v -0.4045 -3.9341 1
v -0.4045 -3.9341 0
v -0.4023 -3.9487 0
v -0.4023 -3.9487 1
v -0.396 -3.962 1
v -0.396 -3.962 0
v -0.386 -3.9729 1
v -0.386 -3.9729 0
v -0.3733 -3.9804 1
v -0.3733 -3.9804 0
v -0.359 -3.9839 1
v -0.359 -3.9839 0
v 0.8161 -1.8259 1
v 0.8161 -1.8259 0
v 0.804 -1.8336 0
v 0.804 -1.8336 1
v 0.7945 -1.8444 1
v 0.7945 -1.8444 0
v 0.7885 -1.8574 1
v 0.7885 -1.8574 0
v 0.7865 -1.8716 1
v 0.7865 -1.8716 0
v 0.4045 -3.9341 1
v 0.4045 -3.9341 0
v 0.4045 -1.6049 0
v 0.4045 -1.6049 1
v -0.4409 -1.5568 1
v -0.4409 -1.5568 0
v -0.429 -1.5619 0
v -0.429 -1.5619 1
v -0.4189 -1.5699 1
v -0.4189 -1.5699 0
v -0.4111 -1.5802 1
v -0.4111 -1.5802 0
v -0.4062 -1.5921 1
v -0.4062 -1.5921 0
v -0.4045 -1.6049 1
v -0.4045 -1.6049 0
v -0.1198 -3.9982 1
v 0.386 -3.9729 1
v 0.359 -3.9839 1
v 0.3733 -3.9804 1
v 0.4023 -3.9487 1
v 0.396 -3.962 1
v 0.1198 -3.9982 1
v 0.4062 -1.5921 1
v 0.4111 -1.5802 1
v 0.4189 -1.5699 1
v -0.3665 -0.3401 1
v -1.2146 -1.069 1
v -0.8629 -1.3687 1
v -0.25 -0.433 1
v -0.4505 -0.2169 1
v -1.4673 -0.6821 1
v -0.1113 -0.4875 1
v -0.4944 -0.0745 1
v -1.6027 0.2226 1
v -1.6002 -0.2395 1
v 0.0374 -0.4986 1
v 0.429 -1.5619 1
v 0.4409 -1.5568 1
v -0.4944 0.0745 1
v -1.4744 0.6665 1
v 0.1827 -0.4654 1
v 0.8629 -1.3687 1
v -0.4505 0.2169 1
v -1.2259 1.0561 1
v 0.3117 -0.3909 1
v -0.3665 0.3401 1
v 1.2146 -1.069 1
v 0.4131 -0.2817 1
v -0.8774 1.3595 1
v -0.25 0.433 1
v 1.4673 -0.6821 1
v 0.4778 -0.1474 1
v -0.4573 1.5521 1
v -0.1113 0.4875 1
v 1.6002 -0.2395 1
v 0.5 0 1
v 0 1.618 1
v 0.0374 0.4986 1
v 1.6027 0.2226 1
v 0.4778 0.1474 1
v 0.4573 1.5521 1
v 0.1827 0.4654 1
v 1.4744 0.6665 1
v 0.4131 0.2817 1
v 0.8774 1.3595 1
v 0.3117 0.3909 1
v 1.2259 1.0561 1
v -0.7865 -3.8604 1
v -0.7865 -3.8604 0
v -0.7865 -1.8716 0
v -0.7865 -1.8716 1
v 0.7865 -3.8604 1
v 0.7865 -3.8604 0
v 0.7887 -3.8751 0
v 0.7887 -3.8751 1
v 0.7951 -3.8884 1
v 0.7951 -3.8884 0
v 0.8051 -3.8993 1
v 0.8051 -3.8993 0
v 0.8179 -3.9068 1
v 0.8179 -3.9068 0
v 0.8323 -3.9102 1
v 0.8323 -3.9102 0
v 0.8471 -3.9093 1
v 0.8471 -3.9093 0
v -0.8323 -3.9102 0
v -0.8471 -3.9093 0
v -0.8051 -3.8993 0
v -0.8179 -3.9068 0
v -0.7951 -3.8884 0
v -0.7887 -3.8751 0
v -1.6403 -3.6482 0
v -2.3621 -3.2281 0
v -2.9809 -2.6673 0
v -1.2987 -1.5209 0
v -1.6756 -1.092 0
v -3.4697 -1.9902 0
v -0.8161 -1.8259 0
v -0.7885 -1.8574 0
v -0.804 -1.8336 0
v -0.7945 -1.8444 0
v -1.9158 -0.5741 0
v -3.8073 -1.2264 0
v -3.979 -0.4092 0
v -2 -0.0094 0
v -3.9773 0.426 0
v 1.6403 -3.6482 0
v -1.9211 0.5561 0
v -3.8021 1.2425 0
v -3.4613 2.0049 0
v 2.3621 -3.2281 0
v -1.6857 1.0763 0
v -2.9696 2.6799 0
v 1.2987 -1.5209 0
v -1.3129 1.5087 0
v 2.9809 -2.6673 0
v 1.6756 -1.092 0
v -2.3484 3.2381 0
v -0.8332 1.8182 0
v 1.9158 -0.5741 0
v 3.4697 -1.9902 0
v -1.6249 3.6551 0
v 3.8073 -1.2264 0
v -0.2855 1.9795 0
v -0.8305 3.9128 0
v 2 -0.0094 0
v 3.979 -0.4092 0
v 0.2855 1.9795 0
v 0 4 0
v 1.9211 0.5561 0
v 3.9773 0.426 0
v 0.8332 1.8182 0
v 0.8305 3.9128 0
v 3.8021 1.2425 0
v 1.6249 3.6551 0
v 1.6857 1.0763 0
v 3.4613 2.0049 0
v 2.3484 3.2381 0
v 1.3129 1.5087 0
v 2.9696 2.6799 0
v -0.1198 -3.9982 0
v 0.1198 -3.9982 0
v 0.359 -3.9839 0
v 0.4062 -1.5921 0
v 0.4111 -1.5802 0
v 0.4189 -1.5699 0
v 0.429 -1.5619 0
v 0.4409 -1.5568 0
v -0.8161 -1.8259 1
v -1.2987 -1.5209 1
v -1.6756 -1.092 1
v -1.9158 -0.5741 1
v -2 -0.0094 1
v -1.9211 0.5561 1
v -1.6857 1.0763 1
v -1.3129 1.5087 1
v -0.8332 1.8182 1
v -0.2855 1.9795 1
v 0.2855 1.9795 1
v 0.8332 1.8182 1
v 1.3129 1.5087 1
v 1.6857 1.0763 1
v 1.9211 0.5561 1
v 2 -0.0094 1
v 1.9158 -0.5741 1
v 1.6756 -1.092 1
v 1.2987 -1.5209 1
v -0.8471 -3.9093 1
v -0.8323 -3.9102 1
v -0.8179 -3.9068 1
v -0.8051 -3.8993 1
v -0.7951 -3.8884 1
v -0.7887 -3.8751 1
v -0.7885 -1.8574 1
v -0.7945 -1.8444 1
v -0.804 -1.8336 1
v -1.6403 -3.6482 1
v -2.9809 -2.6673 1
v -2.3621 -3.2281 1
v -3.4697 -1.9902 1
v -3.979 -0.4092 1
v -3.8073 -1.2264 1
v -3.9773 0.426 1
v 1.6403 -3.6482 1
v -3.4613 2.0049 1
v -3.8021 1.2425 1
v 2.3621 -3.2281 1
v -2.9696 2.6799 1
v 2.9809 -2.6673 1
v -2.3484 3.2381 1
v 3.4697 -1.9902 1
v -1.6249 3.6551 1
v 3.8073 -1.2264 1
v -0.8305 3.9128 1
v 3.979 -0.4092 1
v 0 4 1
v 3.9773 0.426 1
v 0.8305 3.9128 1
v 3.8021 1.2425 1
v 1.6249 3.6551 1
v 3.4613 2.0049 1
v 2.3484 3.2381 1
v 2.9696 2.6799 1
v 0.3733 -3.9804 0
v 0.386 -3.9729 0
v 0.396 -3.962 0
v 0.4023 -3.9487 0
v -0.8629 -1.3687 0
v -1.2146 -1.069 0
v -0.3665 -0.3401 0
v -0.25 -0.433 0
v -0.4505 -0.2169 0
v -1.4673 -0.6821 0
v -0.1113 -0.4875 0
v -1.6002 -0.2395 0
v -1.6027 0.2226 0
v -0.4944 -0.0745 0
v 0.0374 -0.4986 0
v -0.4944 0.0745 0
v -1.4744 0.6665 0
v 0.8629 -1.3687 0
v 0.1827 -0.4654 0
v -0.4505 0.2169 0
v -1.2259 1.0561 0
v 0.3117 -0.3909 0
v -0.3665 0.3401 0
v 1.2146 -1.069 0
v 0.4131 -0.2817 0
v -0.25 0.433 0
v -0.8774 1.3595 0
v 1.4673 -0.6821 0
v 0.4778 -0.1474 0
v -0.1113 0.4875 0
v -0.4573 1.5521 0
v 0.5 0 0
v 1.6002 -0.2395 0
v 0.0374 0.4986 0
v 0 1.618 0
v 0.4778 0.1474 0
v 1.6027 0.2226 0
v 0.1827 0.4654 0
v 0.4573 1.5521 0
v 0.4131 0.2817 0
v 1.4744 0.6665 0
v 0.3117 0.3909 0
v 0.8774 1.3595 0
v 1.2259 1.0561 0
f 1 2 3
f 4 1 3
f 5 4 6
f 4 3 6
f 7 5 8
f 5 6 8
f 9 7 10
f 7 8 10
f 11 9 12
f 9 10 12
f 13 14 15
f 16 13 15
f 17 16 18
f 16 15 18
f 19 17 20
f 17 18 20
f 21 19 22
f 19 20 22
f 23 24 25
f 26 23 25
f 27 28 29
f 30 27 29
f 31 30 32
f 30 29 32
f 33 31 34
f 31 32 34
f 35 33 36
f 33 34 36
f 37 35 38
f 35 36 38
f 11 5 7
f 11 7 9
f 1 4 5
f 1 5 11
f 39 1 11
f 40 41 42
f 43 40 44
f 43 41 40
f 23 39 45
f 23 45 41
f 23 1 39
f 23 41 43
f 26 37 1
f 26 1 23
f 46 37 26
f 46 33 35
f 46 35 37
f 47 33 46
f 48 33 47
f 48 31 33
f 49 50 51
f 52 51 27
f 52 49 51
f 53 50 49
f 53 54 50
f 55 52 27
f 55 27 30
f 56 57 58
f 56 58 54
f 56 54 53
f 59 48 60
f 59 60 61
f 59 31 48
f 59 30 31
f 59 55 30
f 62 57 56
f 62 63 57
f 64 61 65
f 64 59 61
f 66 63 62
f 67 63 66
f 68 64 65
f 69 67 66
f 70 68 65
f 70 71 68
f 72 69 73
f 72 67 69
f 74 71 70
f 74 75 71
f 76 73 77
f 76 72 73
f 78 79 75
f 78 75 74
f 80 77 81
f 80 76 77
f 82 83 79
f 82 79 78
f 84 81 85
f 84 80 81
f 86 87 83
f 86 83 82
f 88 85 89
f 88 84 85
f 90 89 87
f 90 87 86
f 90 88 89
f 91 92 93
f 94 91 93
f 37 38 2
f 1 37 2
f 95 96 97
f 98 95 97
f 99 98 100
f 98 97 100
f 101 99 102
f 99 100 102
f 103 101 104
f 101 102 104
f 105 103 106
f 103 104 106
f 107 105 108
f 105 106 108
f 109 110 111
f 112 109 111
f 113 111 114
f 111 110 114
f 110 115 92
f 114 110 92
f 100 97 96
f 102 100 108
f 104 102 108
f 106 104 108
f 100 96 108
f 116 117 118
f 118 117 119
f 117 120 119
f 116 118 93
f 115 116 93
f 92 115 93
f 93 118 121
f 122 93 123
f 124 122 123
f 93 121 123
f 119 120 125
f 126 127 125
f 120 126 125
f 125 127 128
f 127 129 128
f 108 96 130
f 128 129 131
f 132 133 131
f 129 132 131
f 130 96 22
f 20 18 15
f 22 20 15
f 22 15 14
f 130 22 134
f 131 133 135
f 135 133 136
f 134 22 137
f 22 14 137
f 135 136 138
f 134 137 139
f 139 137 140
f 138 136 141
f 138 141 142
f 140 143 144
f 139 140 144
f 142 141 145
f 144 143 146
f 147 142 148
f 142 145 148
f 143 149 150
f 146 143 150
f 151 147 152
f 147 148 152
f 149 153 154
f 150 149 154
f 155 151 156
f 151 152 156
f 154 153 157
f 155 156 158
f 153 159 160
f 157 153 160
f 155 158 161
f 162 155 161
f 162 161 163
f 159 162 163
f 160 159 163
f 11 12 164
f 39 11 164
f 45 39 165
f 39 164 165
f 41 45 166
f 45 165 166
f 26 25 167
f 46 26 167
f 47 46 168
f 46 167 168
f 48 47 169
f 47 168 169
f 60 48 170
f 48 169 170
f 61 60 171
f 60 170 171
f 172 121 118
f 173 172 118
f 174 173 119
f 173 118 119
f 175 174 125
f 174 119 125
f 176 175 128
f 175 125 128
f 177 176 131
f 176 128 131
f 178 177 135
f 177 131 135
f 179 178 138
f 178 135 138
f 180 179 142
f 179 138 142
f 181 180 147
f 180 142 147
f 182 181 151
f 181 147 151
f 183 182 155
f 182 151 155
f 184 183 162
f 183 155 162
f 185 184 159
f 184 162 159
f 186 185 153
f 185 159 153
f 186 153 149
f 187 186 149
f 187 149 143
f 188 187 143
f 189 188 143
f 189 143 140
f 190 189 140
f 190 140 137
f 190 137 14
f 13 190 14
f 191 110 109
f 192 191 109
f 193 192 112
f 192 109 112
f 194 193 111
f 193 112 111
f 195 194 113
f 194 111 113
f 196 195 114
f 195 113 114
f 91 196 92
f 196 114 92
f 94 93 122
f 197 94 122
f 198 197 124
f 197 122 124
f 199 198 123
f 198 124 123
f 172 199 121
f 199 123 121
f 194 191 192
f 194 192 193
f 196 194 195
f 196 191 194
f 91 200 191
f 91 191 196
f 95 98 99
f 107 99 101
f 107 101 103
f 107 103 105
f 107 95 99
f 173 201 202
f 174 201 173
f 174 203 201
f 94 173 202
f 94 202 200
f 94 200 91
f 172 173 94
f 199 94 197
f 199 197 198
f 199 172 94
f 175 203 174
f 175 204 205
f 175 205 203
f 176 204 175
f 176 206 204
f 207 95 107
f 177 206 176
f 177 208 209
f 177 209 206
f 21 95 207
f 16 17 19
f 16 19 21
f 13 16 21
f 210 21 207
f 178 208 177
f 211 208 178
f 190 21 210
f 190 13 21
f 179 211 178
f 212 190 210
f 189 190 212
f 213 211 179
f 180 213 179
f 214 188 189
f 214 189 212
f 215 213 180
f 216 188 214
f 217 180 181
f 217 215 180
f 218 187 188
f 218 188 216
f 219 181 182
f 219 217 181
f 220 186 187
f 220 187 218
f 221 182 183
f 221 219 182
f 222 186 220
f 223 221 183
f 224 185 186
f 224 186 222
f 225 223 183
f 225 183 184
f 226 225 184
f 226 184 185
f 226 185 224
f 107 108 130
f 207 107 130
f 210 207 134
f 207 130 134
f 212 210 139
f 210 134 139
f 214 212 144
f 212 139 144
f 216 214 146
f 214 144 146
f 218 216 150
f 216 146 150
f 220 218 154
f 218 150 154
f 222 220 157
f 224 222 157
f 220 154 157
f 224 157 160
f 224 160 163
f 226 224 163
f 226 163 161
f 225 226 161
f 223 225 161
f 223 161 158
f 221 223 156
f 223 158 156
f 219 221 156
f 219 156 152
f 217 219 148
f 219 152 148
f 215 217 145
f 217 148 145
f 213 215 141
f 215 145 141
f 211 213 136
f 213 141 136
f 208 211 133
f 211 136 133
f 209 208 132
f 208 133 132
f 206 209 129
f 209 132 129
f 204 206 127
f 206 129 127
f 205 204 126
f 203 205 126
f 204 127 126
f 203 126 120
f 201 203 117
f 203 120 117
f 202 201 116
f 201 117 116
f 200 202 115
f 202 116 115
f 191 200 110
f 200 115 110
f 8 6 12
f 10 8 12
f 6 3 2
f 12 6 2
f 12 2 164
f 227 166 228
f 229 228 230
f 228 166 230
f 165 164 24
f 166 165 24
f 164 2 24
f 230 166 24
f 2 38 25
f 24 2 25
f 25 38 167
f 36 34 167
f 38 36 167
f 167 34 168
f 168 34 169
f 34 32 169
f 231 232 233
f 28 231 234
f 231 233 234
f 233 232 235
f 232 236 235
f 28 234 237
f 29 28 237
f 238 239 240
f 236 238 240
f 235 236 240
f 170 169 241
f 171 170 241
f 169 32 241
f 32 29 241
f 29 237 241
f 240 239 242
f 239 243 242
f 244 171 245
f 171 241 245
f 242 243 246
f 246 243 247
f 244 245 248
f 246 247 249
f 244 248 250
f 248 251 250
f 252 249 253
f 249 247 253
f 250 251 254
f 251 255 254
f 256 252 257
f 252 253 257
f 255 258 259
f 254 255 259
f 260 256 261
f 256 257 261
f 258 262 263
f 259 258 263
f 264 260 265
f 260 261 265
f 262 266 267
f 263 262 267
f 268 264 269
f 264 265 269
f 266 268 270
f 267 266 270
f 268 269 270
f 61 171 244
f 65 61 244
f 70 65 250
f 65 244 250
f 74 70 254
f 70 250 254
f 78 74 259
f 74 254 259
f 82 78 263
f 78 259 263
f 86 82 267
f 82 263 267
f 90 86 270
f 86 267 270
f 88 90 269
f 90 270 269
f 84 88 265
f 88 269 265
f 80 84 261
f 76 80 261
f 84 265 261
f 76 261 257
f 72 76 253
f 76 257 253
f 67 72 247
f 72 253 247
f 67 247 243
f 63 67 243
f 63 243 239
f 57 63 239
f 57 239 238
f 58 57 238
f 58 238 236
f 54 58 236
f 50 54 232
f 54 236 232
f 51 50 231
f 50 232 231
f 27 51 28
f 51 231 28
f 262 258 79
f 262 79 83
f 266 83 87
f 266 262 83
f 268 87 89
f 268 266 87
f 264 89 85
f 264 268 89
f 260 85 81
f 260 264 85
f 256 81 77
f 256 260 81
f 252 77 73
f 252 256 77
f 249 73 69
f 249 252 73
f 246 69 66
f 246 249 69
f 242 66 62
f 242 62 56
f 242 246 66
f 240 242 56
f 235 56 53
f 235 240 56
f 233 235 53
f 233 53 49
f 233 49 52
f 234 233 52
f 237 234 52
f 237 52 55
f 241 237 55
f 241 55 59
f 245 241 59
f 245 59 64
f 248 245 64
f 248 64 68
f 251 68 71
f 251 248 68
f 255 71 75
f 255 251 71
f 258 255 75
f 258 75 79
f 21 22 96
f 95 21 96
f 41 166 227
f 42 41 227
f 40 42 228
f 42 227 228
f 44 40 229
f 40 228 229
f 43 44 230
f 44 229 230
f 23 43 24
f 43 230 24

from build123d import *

# Parameters (mm, degrees)
F0_R     = 0.5
F1_DEPTH = 1


with BuildPart() as f1:
    # F0 (on Top) → F1 (new body)
    with BuildSketch(Plane.XY):
        with BuildLine():
            ThreePointArc((-0.816073, -1.825931), (0, 2), (0.816073, -1.825931))
            ThreePointArc((0.816073, -1.825931), (0.794522, -1.844378), (0.786475, -1.87158))
            Line((0.786475, -1.87158), (0.786475, -3.860416))
            ThreePointArc((0.786475, -3.860416), (0.805085, -3.899335), (0.847063, -3.909282))
            ThreePointArc((0.847063, -3.909282), (0, 4), (-0.847063, -3.909282))
            ThreePointArc((-0.847063, -3.909282), (-0.805085, -3.899335), (-0.786475, -3.860416))
            Line((-0.786475, -3.860416), (-0.786475, -1.87158))
            ThreePointArc((-0.786475, -1.87158), (-0.794522, -1.844378), (-0.816073, -1.825931))
        make_face()
        with BuildLine():
            ThreePointArc((0.404508, -1.604917), (0.414626, -1.574761), (0.440884, -1.556809))
            ThreePointArc((0.440884, -1.556809), (0, 1.618034), (-0.440884, -1.556809))
            ThreePointArc((-0.440884, -1.556809), (-0.414626, -1.574761), (-0.404508, -1.604917))
            Line((-0.404508, -1.604917), (-0.404508, -3.934059))
            ThreePointArc((-0.404508, -3.934059), (-0.391416, -3.967791), (-0.358996, -3.983858))
            ThreePointArc((-0.358996, -3.983858), (0, -4), (0.358996, -3.983858))
            ThreePointArc((0.358996, -3.983858), (0.391416, -3.967791), (0.404508, -3.934059))
            Line((0.404508, -3.934059), (0.404508, -1.604917))
        make_face()
        Circle(F0_R, mode=Mode.SUBTRACT)
    extrude(amount=F1_DEPTH)


solid = f1.part
